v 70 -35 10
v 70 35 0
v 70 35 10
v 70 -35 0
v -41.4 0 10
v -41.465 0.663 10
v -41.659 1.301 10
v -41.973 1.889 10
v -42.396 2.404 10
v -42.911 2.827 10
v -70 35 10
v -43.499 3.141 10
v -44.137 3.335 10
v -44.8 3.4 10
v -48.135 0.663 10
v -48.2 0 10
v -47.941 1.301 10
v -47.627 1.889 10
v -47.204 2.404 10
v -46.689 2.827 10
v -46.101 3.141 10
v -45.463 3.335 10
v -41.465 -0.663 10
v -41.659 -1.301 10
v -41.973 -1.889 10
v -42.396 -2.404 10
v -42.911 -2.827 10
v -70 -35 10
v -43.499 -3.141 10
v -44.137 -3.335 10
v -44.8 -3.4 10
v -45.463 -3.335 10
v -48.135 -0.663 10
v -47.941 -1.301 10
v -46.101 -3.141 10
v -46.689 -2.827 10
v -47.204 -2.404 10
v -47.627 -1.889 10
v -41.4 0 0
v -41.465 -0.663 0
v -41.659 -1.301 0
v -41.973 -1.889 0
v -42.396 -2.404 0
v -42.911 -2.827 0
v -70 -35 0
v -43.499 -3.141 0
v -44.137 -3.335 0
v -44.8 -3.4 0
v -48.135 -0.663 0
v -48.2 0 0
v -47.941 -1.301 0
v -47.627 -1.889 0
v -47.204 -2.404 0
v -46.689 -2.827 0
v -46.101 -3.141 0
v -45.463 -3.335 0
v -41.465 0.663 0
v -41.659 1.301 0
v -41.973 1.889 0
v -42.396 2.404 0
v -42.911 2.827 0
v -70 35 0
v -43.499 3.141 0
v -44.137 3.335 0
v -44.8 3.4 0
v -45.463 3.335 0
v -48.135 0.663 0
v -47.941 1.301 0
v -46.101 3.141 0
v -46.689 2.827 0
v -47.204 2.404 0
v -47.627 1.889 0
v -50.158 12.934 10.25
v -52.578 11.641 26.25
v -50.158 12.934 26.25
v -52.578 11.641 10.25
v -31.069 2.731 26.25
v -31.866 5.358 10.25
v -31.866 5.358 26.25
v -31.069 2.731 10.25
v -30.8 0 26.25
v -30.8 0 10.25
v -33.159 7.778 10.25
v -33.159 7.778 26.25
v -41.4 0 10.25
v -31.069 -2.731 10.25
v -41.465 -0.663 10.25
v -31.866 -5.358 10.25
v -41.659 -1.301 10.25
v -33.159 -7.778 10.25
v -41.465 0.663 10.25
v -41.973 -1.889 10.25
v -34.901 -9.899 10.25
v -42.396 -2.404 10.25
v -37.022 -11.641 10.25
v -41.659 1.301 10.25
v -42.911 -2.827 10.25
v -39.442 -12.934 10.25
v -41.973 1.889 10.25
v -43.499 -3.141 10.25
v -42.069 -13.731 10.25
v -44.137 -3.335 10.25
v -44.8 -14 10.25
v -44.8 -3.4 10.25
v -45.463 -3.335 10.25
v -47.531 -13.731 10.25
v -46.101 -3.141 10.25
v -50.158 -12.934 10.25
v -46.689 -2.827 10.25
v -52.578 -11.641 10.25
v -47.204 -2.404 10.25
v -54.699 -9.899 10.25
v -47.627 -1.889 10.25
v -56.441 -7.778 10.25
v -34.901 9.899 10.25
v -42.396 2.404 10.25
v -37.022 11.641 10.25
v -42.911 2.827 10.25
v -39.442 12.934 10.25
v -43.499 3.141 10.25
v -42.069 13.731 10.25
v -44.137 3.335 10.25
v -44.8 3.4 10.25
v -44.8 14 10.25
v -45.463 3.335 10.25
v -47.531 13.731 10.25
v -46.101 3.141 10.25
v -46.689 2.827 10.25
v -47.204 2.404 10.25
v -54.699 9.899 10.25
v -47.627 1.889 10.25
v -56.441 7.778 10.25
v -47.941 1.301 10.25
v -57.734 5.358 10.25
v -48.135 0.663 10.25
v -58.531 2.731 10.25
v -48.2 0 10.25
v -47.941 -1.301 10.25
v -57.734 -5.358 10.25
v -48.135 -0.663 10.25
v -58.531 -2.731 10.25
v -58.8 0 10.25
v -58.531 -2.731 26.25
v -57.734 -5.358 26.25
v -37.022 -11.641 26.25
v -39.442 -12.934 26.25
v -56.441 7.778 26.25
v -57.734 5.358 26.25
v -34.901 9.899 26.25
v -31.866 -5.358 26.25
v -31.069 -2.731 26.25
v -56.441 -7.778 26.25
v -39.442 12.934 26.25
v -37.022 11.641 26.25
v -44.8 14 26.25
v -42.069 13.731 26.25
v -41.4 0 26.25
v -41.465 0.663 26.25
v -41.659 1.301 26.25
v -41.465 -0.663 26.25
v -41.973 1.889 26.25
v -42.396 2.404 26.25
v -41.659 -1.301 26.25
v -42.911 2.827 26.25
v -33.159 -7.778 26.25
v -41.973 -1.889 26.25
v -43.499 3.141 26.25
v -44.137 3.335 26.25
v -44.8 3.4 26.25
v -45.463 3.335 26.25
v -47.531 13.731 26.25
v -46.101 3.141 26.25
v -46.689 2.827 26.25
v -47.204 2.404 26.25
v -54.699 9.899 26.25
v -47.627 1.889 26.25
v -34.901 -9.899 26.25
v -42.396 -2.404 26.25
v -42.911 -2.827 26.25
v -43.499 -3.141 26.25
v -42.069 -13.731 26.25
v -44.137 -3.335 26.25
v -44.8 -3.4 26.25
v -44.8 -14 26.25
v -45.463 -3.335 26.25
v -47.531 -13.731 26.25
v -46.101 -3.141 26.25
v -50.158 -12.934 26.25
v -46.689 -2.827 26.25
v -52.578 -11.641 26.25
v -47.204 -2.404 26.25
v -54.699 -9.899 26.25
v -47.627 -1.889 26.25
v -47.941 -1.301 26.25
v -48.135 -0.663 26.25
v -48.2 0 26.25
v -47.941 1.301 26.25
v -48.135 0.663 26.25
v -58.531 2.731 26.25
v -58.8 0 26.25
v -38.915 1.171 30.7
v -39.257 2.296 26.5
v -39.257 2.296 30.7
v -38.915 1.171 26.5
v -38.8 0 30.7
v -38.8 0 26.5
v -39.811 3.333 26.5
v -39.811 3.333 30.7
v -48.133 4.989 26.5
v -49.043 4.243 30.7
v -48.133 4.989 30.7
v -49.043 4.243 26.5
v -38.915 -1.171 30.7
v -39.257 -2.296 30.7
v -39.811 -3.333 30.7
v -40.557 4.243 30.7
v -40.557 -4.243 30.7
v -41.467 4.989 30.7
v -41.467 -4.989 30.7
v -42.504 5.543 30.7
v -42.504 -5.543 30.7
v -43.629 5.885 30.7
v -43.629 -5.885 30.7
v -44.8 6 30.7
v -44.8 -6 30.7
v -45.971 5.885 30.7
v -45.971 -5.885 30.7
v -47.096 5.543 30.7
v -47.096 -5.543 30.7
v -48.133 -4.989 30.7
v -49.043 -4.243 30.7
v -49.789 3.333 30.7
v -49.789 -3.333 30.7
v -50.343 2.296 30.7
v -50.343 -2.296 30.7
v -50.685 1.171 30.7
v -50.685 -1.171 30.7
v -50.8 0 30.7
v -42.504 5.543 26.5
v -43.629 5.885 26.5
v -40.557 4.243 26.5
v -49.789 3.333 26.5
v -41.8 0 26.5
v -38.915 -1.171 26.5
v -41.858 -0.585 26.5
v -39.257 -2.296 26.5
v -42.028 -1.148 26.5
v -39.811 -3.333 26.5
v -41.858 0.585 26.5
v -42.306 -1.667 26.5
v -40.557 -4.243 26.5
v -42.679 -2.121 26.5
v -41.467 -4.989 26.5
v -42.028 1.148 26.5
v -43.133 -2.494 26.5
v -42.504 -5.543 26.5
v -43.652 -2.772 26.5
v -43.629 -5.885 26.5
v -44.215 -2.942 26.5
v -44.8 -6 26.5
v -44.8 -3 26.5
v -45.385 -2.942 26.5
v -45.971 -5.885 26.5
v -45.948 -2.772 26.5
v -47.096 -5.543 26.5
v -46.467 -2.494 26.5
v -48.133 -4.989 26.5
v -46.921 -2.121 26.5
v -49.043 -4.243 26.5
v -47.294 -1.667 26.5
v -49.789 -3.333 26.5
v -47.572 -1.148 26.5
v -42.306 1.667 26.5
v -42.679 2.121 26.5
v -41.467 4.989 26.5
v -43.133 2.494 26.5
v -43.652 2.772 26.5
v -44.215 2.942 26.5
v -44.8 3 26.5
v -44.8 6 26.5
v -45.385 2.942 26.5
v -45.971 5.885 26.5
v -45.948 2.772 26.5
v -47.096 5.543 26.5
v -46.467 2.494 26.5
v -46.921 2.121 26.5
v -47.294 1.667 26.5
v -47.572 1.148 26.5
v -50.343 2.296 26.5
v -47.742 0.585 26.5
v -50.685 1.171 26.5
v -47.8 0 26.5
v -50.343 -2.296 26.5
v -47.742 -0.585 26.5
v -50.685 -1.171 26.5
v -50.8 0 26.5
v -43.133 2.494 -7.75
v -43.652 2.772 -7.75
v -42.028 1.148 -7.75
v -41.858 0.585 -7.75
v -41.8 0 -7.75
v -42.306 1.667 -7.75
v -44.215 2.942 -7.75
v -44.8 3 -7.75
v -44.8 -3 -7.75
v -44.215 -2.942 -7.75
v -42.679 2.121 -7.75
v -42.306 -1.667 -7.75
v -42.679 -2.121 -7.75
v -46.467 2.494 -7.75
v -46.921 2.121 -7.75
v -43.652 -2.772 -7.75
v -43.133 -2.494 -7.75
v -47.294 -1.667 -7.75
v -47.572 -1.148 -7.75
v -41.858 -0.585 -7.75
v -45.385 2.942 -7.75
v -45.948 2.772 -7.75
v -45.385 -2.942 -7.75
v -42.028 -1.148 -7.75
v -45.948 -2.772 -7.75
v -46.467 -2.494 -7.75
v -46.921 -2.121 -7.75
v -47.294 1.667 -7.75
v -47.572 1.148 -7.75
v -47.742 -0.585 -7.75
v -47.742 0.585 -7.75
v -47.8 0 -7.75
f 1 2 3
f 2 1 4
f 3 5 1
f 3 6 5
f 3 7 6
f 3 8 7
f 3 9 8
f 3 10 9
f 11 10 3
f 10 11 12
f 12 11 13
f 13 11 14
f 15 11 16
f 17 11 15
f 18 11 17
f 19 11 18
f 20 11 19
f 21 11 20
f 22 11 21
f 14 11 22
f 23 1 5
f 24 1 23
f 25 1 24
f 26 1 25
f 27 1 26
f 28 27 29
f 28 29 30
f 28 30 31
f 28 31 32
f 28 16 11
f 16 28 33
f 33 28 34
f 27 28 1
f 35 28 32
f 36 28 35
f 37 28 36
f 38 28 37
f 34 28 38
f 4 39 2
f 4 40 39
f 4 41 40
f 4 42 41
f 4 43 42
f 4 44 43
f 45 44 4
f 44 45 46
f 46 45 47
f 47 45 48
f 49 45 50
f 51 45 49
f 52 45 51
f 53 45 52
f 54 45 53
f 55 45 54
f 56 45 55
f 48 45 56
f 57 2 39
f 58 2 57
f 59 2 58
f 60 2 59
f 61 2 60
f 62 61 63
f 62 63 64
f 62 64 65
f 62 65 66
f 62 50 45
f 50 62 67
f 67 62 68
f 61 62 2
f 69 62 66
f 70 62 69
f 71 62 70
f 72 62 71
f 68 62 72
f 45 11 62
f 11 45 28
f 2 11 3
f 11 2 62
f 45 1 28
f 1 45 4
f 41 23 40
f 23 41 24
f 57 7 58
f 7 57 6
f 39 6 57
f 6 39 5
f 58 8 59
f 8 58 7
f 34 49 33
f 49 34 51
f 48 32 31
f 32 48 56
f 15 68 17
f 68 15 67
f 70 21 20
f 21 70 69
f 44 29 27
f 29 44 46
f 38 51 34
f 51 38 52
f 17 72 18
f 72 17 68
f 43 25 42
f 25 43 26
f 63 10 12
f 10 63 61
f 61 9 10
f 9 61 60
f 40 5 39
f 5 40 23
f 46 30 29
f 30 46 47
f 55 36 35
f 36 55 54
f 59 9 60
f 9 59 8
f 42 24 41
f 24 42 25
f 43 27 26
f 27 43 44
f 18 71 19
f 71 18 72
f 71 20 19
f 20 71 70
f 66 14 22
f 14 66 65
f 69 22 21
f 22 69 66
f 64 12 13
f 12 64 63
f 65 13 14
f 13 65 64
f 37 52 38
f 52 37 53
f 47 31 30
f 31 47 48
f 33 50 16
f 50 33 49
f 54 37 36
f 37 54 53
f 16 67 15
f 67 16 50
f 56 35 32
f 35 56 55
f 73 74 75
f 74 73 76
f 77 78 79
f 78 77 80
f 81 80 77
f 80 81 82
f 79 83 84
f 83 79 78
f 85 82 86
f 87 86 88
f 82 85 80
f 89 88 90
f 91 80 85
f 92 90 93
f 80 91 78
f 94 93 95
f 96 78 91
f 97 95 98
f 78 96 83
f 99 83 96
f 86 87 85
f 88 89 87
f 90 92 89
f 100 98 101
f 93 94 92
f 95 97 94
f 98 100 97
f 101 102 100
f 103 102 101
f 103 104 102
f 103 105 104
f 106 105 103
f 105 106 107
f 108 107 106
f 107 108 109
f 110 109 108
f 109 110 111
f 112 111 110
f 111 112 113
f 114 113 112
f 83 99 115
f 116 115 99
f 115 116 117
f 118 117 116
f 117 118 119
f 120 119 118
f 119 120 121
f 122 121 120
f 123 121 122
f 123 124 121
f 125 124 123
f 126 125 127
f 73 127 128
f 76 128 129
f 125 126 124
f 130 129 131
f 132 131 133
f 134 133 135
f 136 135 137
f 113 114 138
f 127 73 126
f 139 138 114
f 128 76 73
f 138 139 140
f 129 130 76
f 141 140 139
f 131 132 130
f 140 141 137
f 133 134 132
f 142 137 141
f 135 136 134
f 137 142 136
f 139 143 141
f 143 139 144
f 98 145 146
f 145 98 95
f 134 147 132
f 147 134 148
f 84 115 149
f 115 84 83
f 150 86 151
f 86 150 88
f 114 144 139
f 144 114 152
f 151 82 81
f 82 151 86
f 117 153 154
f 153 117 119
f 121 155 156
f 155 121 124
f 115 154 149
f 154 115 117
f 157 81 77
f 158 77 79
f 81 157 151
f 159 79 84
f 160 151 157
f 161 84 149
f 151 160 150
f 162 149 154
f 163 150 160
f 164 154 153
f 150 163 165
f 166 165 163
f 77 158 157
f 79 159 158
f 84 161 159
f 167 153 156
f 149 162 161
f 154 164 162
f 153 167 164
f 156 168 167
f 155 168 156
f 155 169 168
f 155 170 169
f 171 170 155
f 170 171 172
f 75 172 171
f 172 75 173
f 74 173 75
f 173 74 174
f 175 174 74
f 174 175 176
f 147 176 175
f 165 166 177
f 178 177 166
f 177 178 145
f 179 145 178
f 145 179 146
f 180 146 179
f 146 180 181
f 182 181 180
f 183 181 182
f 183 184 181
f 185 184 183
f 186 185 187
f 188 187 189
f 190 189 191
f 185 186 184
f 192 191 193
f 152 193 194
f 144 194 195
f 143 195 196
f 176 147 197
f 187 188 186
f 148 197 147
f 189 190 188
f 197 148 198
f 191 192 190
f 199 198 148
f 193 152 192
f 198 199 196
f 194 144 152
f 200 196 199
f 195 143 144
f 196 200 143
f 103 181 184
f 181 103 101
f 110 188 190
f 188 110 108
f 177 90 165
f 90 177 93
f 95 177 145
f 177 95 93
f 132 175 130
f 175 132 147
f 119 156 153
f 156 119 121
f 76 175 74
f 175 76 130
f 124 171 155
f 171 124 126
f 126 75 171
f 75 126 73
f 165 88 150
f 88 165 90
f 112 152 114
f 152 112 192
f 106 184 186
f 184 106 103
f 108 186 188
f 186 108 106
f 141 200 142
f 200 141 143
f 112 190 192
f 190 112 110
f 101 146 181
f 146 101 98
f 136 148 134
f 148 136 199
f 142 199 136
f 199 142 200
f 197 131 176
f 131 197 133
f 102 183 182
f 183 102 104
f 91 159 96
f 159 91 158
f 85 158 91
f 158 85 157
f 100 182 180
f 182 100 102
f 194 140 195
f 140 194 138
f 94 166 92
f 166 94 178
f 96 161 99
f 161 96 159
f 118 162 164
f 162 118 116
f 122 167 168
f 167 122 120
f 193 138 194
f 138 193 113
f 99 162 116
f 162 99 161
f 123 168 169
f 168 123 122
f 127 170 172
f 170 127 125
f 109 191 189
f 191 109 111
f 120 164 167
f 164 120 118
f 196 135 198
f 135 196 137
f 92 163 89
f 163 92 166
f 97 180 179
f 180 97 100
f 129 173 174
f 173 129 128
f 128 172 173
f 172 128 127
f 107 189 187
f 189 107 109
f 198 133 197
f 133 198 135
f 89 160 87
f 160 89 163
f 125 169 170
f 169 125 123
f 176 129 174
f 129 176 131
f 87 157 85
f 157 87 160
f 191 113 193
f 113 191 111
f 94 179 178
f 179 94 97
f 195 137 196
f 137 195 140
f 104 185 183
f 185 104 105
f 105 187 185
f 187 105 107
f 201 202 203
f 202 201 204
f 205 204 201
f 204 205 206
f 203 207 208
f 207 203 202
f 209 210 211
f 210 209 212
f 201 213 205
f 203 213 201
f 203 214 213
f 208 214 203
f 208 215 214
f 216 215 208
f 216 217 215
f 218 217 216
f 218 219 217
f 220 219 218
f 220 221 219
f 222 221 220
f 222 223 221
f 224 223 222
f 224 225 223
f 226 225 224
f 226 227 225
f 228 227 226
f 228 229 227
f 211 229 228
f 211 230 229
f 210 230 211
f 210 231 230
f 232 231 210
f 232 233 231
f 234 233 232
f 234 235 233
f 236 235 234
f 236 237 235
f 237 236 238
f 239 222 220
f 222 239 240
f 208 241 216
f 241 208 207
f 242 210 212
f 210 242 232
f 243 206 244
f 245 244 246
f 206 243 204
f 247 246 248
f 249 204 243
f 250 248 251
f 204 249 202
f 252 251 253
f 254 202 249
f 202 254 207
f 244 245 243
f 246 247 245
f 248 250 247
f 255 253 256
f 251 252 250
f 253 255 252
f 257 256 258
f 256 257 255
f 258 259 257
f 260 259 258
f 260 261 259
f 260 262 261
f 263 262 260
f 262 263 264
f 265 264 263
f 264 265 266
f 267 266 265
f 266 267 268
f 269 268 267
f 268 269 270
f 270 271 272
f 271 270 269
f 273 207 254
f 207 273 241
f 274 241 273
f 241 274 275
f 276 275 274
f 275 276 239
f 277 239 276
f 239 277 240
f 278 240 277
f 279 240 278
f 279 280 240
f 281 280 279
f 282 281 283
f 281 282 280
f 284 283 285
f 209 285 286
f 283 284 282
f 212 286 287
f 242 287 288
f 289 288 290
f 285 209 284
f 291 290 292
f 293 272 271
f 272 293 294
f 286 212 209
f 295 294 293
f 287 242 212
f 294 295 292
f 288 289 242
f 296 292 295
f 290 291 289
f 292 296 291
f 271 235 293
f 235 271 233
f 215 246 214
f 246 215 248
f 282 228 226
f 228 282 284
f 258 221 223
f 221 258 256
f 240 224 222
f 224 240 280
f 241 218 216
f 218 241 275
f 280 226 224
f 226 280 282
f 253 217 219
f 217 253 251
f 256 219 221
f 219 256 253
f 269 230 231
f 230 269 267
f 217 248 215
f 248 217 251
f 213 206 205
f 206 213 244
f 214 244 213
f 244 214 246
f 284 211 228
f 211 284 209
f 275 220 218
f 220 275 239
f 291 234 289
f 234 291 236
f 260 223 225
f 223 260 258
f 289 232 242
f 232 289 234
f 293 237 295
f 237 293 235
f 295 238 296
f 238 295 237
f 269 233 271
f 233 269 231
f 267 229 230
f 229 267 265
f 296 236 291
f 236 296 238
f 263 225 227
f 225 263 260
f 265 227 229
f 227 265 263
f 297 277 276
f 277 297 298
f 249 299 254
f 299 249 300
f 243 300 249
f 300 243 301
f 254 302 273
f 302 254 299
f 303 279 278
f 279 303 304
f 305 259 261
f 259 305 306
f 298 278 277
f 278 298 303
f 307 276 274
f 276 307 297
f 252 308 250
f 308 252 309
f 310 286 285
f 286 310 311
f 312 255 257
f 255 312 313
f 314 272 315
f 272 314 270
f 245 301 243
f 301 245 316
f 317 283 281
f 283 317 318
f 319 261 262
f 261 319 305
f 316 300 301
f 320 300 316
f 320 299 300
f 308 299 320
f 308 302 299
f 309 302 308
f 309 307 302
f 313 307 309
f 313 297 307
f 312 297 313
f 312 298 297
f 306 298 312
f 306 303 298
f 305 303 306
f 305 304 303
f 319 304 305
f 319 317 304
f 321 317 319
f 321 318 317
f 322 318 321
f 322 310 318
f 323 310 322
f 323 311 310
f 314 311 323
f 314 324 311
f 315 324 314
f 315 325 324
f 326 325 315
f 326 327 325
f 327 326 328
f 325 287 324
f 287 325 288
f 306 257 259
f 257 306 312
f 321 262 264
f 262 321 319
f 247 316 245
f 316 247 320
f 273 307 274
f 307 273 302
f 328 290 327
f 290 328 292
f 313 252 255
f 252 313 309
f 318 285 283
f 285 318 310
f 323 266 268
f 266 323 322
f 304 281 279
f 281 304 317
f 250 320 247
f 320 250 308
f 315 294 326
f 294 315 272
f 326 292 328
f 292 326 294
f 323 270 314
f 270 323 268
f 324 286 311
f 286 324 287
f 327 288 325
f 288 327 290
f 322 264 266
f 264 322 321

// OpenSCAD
$fn = 32;

// ------------------------------------------------------------------------
// Standoff columns: 1 d28 standoffs, bolts d6
// Every part is its own module, assembly() places them once.
// ------------------------------------------------------------------------

// --- part 1 ---
module base_plate() {
  difference() {
    translate([-70, -35, 0]) cube([140, 70, 10]);
    translate([-44.8, 0, -1]) cylinder(h = 12, d = 6.8);
  }
}

// --- part 2 ---
module spacer() {
  difference() {
      translate([0, 0, 0]) cylinder(h = 16, d = 28);
      translate([0, 0, -1]) cylinder(h = 18, d = 6.8);
    }
}

// --- part 3 ---
module bolt() {
  cylinder(h = 4.2, d = 12);
  translate([0, 0, -34.25]) cylinder(h = 34.25, d = 6);
}

// --- assembly ---
module assembly() {
  translate([0, 0, 0]) rotate([0, 0, 0]) base_plate();
  translate([-44.8, 0, 10.25]) rotate([0, 0, 0]) spacer();
  translate([-44.8, 0, 26.5]) rotate([0, 0, 0]) bolt();
}

assembly();
